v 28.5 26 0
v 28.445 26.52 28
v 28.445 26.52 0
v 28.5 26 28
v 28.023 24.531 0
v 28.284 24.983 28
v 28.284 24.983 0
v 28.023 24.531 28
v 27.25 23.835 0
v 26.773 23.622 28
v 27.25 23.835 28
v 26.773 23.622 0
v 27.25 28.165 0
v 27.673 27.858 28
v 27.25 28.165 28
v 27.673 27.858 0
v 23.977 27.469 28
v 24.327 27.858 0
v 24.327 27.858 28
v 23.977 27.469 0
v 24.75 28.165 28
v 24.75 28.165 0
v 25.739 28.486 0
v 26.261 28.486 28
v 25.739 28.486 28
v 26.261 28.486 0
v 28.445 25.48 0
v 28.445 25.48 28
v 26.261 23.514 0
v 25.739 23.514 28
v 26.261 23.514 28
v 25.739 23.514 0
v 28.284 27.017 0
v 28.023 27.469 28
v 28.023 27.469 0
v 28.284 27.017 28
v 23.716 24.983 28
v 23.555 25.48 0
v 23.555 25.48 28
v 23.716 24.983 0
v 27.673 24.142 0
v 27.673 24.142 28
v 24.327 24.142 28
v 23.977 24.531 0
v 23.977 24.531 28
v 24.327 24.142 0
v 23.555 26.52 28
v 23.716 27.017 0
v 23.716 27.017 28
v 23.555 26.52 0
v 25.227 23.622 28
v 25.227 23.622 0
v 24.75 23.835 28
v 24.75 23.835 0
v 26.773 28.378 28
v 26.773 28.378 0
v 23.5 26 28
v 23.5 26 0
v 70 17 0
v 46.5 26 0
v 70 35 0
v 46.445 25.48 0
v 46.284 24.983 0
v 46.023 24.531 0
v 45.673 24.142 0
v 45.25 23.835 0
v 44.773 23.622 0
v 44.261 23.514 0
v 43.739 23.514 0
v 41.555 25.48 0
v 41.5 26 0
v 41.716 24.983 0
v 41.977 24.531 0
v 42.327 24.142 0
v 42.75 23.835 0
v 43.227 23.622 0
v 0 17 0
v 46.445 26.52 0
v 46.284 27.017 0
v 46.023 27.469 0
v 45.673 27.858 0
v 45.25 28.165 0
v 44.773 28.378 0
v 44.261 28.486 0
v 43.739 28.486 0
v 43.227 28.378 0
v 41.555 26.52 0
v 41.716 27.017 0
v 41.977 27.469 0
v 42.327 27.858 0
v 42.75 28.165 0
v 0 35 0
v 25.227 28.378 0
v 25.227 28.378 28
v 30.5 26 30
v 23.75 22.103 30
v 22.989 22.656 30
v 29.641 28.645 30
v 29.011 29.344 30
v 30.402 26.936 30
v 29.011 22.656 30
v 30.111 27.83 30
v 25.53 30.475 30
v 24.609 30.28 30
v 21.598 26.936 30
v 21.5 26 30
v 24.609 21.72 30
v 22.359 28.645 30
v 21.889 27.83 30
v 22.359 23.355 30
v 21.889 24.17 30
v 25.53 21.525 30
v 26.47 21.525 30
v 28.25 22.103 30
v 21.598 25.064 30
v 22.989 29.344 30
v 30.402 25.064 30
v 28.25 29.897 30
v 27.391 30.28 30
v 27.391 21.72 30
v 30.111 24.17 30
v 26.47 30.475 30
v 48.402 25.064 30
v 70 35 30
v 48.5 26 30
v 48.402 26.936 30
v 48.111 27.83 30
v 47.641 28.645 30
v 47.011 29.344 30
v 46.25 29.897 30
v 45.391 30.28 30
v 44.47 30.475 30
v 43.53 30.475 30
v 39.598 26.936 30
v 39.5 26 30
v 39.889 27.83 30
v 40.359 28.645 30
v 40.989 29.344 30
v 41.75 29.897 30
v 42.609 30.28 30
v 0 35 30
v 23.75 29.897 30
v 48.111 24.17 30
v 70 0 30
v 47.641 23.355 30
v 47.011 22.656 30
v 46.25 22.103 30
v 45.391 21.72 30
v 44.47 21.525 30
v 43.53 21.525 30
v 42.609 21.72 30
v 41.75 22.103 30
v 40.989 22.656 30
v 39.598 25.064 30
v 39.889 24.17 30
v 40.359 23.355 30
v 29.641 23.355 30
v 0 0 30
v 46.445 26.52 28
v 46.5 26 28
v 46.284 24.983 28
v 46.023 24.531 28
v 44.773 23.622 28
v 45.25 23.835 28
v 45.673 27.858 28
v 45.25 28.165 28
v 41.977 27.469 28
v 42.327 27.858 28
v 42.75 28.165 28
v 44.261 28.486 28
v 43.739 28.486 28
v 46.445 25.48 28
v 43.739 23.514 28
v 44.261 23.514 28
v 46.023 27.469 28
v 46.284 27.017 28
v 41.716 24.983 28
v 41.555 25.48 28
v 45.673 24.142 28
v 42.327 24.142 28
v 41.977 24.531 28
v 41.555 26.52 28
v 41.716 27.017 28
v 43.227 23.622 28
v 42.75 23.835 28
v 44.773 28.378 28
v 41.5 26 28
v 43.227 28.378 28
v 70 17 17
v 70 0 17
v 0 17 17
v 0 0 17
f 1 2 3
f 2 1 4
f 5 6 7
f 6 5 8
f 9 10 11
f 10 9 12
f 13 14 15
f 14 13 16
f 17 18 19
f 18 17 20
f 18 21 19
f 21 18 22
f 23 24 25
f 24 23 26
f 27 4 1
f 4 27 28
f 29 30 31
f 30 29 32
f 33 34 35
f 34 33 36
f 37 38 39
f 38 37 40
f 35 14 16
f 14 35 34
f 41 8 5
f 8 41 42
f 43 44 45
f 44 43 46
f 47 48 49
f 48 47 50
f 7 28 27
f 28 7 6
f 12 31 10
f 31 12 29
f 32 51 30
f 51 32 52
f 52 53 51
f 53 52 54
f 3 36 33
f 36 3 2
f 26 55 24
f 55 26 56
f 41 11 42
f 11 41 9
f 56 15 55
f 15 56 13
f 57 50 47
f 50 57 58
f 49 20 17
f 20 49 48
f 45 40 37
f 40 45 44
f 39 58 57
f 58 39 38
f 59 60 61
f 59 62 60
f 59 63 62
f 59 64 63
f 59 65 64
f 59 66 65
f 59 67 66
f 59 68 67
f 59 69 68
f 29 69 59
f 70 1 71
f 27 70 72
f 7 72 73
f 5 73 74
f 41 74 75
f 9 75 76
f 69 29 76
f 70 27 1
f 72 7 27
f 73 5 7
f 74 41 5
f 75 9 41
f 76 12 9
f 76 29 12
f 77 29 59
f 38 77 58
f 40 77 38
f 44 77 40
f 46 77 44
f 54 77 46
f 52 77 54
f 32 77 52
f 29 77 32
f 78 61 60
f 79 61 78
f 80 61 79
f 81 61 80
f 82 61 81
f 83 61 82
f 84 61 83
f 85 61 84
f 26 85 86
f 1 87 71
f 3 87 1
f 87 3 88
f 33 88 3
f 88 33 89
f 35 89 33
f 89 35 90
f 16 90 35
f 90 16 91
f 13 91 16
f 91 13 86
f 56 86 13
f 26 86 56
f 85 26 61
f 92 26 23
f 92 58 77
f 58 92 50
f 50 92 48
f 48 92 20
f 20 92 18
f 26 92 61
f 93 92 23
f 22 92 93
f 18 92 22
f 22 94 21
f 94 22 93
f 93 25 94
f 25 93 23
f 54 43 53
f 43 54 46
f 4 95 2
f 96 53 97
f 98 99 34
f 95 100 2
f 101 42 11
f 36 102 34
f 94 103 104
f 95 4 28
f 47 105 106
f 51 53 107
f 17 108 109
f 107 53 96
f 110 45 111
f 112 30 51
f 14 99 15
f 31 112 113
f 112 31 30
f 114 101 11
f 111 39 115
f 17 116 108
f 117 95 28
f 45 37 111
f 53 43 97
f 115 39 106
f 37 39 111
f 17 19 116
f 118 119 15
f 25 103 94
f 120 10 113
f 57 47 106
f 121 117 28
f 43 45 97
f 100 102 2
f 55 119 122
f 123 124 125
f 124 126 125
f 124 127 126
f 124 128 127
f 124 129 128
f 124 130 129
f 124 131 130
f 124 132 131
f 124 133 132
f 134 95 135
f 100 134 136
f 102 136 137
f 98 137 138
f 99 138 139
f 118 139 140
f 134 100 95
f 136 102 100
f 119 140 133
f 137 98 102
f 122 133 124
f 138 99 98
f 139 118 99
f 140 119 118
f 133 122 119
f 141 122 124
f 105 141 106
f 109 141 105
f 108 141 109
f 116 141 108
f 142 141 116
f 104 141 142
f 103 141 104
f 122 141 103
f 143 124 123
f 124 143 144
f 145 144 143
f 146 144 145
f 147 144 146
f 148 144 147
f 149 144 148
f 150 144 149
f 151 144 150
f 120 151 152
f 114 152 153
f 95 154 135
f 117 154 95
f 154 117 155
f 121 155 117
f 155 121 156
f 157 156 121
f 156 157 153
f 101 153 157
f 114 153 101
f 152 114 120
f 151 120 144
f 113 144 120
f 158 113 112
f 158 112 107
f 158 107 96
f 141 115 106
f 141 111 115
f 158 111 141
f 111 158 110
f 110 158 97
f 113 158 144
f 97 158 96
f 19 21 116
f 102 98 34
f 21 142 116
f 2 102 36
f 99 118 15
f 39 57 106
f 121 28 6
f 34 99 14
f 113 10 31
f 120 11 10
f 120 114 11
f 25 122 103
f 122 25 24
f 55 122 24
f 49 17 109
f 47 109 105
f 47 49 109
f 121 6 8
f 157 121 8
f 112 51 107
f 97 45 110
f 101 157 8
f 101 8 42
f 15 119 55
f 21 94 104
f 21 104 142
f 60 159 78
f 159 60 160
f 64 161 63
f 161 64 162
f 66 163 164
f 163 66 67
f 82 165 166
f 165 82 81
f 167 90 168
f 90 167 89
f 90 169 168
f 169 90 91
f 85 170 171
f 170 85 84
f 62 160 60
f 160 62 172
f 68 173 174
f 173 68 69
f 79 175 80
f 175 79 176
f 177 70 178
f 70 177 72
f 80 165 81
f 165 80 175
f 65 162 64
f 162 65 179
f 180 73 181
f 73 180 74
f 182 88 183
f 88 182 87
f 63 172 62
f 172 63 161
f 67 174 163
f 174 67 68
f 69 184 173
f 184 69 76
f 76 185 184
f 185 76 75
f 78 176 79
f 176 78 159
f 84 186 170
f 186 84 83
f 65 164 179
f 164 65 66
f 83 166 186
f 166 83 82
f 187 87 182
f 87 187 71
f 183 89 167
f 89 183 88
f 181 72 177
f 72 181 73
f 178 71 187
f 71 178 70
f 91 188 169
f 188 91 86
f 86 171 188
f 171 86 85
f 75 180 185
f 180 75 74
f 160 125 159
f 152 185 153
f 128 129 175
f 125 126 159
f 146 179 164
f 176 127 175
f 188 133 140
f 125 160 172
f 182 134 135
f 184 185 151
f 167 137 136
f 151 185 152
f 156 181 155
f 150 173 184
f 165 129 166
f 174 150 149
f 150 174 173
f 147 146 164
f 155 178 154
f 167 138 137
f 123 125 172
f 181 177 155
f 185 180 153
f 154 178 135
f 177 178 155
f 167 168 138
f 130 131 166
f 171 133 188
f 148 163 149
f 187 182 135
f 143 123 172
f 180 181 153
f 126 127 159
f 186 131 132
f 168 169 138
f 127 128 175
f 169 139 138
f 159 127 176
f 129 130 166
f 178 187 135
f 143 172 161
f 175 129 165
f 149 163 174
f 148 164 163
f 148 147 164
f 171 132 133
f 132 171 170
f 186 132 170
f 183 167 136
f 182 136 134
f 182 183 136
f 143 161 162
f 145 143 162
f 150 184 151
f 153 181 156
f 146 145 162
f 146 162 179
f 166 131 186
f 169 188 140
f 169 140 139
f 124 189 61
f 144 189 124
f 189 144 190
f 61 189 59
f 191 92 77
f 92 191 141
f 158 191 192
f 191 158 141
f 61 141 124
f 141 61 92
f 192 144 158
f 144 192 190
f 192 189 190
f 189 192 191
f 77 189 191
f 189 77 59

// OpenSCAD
// file: atis_lib.scad
// Gyűrű fix falvastagsággal. Ez az eredeti. Nem változtatom meg, mert több helyen már használom
module gyuru(r1, r2,h, w, center=false){
    difference(){
        cylinder(r1=r1,r2=r2,h, center=center, $fn=12*r1);
        translate([0,0,-0.1])cylinder(r1=r1-w, r2=r2-w,h+0.2, center=center, $fn=12*(r1-w)); // trükközés: már preview-ban is normálisan jelenjen meg a gyűrű
    }
}

// Gyűrű fix belső átmérővel

module gyuru_fixrb(r1, r2, h, r_belso, center=false){
    difference(){
        cylinder(r1=r1, r2=r2, h, center=center, $fn=12*r1);
        translate([0,0,-0.1])cylinder(r=r_belso, h+0.2, center=center, $fn=12*r_belso);
    }
    
}

//inset_width= min(nozzle dia/2, 0.4)
module inset_first_layer(inset_height=0.31,inset_width=0.2, render=false)
{   
    if (render == true){
        difference()
        { 
            children();

            translate([0,0,-1])
            linear_extrude(height=inset_height+1)
            difference()
            {
                offset(r = inset_width) 
                projection(cut=true) 
                translate([0,0,-inset_height])
                children();

                offset(r = -inset_width) 
                projection(cut=true) 
                translate([0,0,-inset_height])
                children();
            }
        } 
    }
    else{
        echo("Inset not rendered!");
    }
} 

module deszka(m, sz, v, vastagsag, cimke){
    cube([m,sz,v], center=true);
    if (m == vastagsag){
        t = sz * v;
        echo(cimke, m , sz, v, t/1000/1000);
    } else if (sz == vastagsag){
            t = m*v;
            echo(cimke, m , sz, v, t/1000/1000);
    } else if (v == vastagsag){
            t = m*sz;
            echo(cimke, m , sz, v, t/1000/1000);
    }
    echo(cimke, m , sz, v, t);
}



// csm=[melyseg, szelesseg, magassag, also resz magassag, ,henger sugara

//csatlakozo([5,10,20,2,2,1.5]);

module csatlakozo(csm){
    cw = csm[0];
    sz = csm[1];
    h = csm[2];
    ch = csm[3];
    ny = csm[4];
    R=csm[5];
    translate([-cw/2, -sz/2, -h/2]){
        cube([cw,sz,ch]);
        translate([0,sz,ch])
            rotate([90,0,0])
                linear_extrude(height=sz)polygon([[0,0], [cw, 0], [0,cw+1], [0,0]]);
        translate([0,(sz-ny)/2,0])
        intersection()
        {
            translate([0,R+ny/2,0])
                rotate([90,0,0])
                    linear_extrude(height=2*R)polygon([[0,0], [cw, 0], [cw, h-cw-1], [0,h], [0,0]]);
            union(){
                cube([cw-R,ny, h]);
                translate([cw-R-0.5,ny/2,0]) cylinder(r=R, h=h,$fn=80);
            }
        }
    }
}

module gombolyitett_csatlakozo(csm){
    cw = csm[0]-1;
    sz = csm[1]-2;
    h = csm[2]-2;
    ch = csm[3];
    ny = csm[4];
    R=csm[5];
    translate([-cw/2, -sz/2, -h/2]){
        cube([cw,sz,ch]);
        translate([0,sz,ch])
            rotate([90,0,0])
                linear_extrude(height=sz)polygon([[0,0], [cw, 0], [0,cw+1], [0,0]]);
        translate([0,(sz-ny)/2,0])
        intersection()
        {
            translate([0,R+ny/2,0])
                rotate([90,0,0])
                    linear_extrude(height=2*R)polygon([[0,0], [cw, 0], [cw, h-cw-1], [0,h], [0,0]]);
            union(){
                cube([ny, ny,h]);
                translate([cw-R-0.5,ny/2,0]) cylinder(r=R, h=h,$fn=80);
            }
        }
    }
}

module kivagas(l, d, w){
    hull(){
        cylinder(r=d/2,h = w-2, $fn=12*d/2);
        translate([l-d,0,0])cylinder(r=d/2, h=w-2, $fn=12*d/2);
    }
    translate([0,0,w-2])hull(){
        cylinder(r1=d/2, r2=d/2+2,h = 2, $fn=12*d/2);
        translate([l-d,0,0])cylinder(r1=d/2, r2=d/2+2, h=2, $fn=12*d/2);
    }
}

function shelly1L_befoglalo() = [44, 38, 14];
function shellyRGBW2_befoglalo() = shelly1L_befoglalo();

module shellyRGBW2(){
    shelly1L();
}

module shelly1L(){
    b = shelly1L_befoglalo();
    s_h = b[2];
    s_w = b[0];
    s_d = b[1];
    module lecsapott_sarok(){
        echo(s_h);
        linear_extrude(height=s_h)polygon([[0,0],[0,11],[11,0],[0,0]]);
    }
    difference(){
        cube([s_w,s_d,s_h]);
        lecsapott_sarok();
        translate([s_w,0,0])rotate(90)lecsapott_sarok();
    }
    
}
// main file
use <atis_lib.scad>
sz=70;
m=30;
mlysg=35;
difference(){
    cube([sz,mlysg,m]);
    cube([180,17,17]);
    eltolas=17+(mlysg-17)/2;
    translate([0,eltolas,0]){
        translate([eltolas,0,0])#kivagas(5,5,30);
        translate([sz-eltolas,0,0])kivagas(5,5,30);
    }
}
